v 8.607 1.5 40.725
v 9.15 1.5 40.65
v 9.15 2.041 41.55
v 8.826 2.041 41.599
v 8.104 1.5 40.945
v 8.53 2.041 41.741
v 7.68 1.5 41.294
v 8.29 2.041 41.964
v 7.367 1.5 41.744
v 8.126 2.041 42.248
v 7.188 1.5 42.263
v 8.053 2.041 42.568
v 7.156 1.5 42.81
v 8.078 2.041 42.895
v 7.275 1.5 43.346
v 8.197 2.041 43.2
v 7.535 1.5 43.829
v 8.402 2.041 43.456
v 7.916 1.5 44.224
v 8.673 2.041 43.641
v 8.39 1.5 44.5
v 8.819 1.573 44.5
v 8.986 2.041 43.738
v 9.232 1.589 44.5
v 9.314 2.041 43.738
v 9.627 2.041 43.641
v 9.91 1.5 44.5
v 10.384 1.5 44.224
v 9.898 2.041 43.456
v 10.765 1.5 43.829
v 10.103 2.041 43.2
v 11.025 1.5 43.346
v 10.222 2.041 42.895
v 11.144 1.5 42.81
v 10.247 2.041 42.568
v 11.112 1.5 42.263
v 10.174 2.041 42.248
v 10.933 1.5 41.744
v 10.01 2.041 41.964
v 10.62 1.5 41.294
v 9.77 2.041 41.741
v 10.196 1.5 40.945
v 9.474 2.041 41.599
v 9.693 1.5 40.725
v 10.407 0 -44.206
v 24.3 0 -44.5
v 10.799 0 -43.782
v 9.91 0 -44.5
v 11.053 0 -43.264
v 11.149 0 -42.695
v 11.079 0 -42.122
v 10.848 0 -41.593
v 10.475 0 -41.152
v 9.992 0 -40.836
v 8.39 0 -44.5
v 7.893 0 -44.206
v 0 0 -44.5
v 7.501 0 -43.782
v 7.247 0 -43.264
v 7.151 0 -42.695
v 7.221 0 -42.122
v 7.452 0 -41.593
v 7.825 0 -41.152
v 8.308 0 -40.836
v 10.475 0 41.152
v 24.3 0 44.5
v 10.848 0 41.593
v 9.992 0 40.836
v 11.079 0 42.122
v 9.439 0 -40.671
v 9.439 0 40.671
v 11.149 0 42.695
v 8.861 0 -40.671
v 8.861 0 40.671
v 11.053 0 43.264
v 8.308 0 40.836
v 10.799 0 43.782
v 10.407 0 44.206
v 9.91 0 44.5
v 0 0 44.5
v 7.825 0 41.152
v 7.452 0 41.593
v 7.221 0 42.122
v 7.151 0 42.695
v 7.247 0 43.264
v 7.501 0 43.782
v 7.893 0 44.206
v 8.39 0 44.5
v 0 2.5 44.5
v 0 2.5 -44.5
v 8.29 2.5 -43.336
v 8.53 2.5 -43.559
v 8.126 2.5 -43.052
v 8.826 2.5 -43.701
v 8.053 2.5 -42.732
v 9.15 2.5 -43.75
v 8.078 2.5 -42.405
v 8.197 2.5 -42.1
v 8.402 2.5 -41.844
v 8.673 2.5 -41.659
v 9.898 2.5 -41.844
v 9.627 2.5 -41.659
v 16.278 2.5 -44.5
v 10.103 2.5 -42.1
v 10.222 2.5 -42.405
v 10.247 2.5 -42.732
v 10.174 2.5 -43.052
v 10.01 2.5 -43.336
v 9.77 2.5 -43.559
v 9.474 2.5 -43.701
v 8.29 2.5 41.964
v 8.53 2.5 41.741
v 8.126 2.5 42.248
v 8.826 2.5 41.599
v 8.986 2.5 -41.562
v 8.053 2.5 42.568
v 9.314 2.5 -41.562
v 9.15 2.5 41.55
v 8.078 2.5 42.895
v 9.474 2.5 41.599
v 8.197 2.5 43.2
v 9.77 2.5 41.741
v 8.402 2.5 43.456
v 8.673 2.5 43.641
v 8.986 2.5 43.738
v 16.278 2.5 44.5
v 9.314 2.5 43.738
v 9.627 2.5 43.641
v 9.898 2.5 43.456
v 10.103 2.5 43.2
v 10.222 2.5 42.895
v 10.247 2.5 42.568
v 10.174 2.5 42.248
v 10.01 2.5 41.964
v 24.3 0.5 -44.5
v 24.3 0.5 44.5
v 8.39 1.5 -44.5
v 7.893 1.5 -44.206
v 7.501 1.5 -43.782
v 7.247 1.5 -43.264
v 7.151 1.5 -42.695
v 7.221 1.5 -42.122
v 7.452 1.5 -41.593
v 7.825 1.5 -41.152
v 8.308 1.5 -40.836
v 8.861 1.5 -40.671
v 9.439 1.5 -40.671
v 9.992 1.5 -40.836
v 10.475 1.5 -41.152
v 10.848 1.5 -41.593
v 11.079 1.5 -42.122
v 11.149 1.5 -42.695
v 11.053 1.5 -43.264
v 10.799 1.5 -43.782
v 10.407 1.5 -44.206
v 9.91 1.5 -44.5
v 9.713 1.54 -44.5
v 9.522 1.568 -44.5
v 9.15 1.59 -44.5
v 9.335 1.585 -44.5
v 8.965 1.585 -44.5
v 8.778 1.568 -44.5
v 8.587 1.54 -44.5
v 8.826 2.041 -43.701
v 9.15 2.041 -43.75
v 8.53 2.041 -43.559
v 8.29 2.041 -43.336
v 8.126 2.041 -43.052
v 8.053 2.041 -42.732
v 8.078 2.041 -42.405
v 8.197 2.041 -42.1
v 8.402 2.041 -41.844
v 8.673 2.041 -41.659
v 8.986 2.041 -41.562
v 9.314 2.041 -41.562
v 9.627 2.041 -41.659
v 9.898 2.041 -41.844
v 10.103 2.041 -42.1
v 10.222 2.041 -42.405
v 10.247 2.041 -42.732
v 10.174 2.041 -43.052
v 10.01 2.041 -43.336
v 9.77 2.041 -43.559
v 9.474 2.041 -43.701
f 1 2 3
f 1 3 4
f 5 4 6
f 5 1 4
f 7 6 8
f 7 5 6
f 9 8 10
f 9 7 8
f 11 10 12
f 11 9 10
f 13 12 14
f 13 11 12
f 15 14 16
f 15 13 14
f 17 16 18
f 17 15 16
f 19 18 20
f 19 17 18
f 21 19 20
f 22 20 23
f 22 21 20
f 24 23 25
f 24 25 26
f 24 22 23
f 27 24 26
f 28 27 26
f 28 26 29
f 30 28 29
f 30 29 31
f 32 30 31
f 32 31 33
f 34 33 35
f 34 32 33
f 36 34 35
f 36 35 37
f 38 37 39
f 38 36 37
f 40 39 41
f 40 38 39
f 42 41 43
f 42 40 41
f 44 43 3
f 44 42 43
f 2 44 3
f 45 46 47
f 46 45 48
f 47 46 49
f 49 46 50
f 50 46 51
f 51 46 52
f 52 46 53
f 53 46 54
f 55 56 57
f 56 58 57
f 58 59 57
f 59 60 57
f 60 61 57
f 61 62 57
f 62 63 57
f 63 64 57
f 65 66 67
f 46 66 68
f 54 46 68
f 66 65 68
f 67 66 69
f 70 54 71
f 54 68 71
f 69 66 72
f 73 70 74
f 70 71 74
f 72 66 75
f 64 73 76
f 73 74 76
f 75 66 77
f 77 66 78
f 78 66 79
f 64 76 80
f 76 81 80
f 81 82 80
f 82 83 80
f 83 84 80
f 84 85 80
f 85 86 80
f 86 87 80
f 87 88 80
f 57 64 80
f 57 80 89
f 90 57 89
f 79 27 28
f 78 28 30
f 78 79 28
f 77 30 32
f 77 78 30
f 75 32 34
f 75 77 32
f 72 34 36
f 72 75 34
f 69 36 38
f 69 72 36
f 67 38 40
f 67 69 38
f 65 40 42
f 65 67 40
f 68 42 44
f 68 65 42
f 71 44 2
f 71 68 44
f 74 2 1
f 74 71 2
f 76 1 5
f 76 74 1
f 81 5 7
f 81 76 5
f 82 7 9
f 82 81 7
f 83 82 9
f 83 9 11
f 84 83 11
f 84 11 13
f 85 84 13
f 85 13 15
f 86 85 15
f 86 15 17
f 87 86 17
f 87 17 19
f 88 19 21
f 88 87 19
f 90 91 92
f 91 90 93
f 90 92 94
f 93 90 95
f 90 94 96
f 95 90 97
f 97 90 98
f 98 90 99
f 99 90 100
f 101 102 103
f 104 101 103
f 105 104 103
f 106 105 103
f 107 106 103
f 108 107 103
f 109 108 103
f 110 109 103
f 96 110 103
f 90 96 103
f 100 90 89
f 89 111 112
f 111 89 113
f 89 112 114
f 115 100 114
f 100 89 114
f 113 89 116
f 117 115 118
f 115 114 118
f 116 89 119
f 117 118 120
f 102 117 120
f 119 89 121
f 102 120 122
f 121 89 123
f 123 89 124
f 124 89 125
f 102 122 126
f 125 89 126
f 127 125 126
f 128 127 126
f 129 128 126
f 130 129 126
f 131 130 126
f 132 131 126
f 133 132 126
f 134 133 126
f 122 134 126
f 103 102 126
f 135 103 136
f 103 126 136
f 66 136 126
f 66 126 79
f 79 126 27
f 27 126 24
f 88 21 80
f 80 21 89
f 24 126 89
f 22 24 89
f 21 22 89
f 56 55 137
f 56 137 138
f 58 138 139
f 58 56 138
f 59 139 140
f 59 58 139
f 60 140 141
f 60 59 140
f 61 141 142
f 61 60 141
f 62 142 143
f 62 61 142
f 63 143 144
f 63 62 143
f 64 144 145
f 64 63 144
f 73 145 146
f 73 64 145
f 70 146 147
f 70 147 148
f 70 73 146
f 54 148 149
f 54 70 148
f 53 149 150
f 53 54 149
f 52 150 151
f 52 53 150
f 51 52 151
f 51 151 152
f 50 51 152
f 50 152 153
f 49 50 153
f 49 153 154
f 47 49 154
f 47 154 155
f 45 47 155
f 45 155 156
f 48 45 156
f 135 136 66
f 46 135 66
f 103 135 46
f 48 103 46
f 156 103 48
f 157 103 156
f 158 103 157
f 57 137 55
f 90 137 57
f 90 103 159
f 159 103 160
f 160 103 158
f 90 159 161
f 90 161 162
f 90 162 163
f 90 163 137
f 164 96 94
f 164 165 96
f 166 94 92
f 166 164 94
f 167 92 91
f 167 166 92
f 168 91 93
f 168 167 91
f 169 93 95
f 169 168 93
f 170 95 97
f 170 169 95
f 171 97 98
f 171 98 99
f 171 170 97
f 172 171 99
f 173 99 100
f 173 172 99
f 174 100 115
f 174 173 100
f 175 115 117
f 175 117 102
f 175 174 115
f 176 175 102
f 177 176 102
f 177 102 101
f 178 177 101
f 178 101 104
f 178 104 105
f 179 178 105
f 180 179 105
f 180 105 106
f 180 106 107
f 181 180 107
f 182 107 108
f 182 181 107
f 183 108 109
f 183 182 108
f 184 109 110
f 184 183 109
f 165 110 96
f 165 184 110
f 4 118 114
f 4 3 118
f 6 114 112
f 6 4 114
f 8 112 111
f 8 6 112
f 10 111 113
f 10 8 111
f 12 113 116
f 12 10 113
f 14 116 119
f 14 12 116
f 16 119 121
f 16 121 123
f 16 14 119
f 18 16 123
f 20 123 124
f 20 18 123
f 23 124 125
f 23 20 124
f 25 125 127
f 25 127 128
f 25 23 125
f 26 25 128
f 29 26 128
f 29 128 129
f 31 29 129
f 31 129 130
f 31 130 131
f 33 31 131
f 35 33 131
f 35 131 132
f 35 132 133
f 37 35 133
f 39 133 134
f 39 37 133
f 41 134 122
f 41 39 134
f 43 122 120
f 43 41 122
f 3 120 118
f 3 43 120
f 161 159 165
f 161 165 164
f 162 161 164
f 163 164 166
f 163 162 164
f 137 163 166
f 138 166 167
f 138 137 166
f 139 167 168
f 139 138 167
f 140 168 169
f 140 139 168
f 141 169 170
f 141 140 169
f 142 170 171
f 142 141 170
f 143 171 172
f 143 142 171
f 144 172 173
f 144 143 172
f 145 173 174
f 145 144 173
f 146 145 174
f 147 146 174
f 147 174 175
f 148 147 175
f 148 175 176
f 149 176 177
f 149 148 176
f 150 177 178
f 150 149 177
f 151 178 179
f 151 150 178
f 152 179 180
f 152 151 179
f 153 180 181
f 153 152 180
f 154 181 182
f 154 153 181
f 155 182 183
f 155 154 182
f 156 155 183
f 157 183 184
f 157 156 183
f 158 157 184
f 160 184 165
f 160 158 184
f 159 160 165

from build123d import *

# Parameters (mm, degrees)
BOSS_EXTRUDE1_DEPTH = 44.5
HOLEWZD2_AT_2_COUNT = 2
HOLEWZD2_AT_2_PITCH = 85.3


with BuildPart() as part:
    # Sketch1 → Boss-Extrude1 (new, symmetric)
    with BuildSketch(Plane.XY):
        Polygon((0, 0), (0, 2.5), (16.278438133, 2.5), (24.3, 0.5), (24.3, 0), align=None)
    extrude(amount=BOSS_EXTRUDE1_DEPTH, both=True)

    # Sketch6 → HoleWzd2 (revolve, cut)
    with BuildSketch(Plane(origin=(9.15, 0, 42.65), x_dir=(0, 0, -1), z_dir=(1, 0, 0))):
        Polygon((0, 0), (0, 2.5), (1.1, 2.5), (1.1, 2.040774557), (2, 1.5), (2, 0), align=None)
    holewzd2 = revolve(axis=Axis((9.15, -6.130023899, 42.65), (0, 1, 0)), mode=Mode.SUBTRACT)

    # HoleWzd2 at 2: HoleWzd2 ×2
    with Locations(*[(0, 0, -i * HOLEWZD2_AT_2_PITCH) for i in range(1, HOLEWZD2_AT_2_COUNT)]):
        add(holewzd2, mode=Mode.SUBTRACT)


solid = part.part
